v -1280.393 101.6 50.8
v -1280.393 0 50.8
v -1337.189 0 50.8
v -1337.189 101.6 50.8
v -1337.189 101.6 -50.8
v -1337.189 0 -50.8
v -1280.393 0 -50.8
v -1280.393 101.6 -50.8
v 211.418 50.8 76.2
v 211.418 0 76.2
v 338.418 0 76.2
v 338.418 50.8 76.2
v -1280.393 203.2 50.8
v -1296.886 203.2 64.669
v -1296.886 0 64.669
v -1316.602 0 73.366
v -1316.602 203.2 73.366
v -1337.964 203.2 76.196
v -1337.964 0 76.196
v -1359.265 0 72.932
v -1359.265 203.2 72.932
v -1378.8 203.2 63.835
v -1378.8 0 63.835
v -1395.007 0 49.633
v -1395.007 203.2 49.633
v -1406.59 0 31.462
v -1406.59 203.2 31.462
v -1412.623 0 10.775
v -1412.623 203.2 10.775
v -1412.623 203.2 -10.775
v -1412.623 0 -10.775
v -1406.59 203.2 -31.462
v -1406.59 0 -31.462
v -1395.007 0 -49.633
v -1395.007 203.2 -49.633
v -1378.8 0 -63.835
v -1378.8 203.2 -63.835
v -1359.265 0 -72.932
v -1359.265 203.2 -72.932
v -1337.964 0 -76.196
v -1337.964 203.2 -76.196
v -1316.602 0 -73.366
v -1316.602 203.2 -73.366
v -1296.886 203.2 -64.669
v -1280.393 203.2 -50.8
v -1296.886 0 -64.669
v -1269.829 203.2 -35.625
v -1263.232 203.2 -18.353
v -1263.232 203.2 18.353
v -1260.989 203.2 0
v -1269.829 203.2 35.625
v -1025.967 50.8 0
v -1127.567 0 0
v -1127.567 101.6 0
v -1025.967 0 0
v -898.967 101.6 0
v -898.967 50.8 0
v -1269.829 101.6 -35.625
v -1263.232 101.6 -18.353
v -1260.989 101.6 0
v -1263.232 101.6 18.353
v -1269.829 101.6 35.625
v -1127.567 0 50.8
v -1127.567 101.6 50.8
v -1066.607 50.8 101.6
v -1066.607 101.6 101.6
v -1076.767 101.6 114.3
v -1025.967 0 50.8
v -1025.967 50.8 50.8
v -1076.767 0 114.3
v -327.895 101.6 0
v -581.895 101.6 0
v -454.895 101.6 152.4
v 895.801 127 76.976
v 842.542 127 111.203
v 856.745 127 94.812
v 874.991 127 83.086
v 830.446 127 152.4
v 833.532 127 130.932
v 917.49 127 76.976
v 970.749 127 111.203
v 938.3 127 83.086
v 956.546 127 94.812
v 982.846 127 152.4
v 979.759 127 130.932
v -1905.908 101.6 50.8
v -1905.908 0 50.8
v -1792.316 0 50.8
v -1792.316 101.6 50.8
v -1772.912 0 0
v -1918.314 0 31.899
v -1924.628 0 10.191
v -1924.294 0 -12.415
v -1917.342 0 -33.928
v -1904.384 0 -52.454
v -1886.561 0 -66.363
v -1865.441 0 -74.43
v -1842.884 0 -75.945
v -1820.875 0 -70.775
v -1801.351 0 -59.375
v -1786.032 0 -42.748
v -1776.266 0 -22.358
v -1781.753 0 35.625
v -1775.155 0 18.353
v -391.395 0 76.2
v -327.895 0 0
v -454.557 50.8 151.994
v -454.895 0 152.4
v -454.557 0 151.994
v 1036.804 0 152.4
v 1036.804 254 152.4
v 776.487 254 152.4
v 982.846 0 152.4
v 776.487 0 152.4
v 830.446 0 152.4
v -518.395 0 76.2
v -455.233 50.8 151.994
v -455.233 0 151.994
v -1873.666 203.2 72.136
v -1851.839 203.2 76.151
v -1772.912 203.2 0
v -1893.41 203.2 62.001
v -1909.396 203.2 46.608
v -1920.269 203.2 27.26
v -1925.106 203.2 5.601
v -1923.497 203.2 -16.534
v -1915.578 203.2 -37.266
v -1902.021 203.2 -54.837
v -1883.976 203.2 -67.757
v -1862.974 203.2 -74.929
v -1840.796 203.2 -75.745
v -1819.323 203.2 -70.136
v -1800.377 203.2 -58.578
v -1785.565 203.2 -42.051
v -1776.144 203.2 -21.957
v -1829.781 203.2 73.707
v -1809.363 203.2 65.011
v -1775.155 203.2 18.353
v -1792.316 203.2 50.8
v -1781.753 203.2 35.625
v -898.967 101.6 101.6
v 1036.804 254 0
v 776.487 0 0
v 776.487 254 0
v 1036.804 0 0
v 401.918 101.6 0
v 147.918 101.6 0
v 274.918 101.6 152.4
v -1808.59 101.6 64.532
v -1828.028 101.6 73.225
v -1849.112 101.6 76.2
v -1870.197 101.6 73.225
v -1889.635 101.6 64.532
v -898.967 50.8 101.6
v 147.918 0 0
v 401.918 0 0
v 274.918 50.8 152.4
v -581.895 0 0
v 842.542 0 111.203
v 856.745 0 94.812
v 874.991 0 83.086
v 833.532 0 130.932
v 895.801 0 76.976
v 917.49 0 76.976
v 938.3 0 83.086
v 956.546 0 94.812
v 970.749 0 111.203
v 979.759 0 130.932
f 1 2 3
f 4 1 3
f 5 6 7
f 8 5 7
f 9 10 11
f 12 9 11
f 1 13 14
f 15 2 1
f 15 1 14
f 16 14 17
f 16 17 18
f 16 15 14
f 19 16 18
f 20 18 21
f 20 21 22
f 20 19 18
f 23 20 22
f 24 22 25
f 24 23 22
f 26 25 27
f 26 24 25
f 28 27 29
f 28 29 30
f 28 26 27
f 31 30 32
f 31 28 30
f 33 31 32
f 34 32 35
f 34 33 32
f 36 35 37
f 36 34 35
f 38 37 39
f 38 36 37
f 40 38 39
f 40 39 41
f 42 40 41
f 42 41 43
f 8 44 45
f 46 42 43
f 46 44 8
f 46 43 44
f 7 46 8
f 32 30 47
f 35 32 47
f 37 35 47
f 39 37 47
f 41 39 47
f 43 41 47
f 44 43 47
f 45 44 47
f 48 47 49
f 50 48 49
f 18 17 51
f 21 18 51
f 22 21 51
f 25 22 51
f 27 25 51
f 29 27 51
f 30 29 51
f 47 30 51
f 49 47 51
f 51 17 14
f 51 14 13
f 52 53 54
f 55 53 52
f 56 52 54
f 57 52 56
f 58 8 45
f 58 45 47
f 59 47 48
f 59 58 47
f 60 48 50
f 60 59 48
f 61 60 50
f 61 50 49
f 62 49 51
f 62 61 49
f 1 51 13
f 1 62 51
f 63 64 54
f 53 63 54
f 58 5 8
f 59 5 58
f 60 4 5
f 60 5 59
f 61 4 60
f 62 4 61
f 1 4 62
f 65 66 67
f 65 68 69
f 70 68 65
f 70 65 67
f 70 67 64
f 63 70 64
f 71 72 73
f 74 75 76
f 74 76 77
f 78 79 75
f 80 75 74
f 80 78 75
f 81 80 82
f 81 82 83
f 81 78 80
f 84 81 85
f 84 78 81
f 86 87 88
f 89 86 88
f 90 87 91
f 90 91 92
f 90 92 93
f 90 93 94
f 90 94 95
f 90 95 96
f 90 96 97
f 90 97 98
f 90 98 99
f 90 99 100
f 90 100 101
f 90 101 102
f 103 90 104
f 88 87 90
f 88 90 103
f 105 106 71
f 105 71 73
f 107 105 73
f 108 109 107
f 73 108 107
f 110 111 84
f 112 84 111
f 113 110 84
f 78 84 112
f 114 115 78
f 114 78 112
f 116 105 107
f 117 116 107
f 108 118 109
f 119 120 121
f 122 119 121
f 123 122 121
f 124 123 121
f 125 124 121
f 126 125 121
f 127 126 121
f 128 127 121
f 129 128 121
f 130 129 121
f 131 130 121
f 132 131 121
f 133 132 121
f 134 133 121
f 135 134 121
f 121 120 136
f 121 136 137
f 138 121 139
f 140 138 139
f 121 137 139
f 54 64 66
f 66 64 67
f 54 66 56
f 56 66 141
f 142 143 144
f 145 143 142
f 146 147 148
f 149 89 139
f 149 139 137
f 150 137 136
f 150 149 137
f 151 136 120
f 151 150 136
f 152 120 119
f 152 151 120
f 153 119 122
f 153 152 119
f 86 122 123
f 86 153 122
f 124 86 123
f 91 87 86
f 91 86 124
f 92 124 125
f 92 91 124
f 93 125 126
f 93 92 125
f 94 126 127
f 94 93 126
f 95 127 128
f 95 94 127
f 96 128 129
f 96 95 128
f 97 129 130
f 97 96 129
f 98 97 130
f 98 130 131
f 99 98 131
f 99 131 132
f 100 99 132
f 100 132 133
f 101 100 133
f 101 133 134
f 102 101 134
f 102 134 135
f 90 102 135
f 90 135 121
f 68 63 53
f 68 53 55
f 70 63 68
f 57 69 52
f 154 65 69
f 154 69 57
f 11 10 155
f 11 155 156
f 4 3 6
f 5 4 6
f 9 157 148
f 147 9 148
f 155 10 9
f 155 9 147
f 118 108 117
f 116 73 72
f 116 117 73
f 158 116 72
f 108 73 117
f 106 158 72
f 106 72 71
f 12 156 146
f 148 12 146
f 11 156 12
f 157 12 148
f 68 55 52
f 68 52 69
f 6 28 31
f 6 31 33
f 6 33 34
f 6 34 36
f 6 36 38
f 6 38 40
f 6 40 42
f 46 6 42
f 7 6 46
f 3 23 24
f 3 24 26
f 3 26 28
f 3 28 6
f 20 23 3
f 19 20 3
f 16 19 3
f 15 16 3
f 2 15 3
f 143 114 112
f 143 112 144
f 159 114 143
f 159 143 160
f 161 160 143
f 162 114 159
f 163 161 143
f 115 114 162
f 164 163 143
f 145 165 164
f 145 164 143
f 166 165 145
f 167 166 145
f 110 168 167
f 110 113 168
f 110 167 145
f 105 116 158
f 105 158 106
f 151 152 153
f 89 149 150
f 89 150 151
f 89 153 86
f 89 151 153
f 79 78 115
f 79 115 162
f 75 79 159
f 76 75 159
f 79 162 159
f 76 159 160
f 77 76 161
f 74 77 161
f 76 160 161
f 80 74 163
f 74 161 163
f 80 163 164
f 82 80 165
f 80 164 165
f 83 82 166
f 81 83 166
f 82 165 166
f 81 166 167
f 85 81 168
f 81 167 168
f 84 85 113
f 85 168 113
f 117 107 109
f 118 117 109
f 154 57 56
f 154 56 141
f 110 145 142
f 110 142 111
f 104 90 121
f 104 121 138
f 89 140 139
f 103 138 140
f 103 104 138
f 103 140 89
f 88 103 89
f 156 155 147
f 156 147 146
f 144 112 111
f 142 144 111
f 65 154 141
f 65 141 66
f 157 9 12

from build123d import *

# Parameters (mm, degrees)
F1_DEPTH  = 101.6
F2_DEPTH  = 101.6
F3_DEPTH  = 50.8
F5_DEPTH  = 101.6
F9_DEPTH  = 63.5
F10_W     = 127
F10_H     = 50.8
F11_DEPTH = 101.6
F12_DEPTH = 50.8
F14_DEPTH = 203.2
F15_DEPTH = 101.6
F17_DEPTH = 203.2
F18_DEPTH = 101.6
F20_DEPTH = 254
F21_DEPTH = 127


with BuildPart() as f1:
    # F0 (on Front) → F1 (new body)
    with BuildSketch(Plane.XZ):
        Polygon((211.4180455208, 76.2), (147.9180455208, 0), (401.9180455208, 0), (338.4180455208, 76.2), align=None)
    extrude(amount=-F1_DEPTH)

    # F0 (on Front) → F2 (join)
    with BuildSketch(Plane.XZ):
        Polygon((274.9180455208, 152.4), (211.4180455208, 76.2), (338.4180455208, 76.2), align=None)
    extrude(amount=-F2_DEPTH)

    # F0 (on Front) → F3 (cut)
    with BuildSketch(Plane.XZ):
        Polygon((274.9180455208, 152.4), (211.4180455208, 76.2), (338.4180455208, 76.2), align=None)
    extrude(amount=-F3_DEPTH, mode=Mode.SUBTRACT)


with BuildPart() as f5:
    # F4 (on Front) → F5 (new body)
    with BuildSketch(Plane.XZ):
        Polygon((-581.8947255611, 0), (-327.8947255611, 0), (-391.3947255611, 76.2), (-454.8947255611, 76.2), (-518.3947255611, 76.2), align=None)
        Polygon((-454.8947255611, 76.2), (-391.3947255611, 76.2), (-454.8947255611, 152.4), align=None)
        Polygon((-454.8947255611, 152.4), (-518.3947255611, 76.2), (-454.8947255611, 76.2), align=None)
    extrude(amount=-F5_DEPTH)

    # F8 (on 3pt) → F9 (cut, symmetric)
    with BuildSketch(Plane.YZ.offset(-454.8947255611)):
        Polygon((0, 151.9944816828), (0, 76.2), (50.8, 151.9944816828), align=None)
    extrude(amount=F9_DEPTH, both=True, mode=Mode.SUBTRACT)


with BuildPart() as f11:
    # F10 (on Front) → F11 (new body)
    with BuildSketch(Plane.XZ):
        Polygon((-1025.9668144226, 50.8), (-898.9668144226, 50.8), (-898.9668144226, 101.6), (-1066.6068144226, 101.6), align=None)
        Polygon((-1127.5668144226, 0), (-1025.9668144226, 0), (-1025.9668144226, 50.8), (-1066.6068144226, 101.6), (-1076.7668144226, 114.3), (-1127.5668144226, 50.8), align=None)
        with Locations((-962.4668144226, 25.4)):
            Rectangle(F10_W, F10_H)
    extrude(amount=-F11_DEPTH)

    # F10 (on Front) → F12 (cut)
    with BuildSketch(Plane.XZ):
        Polygon((-1025.9668144226, 50.8), (-898.9668144226, 50.8), (-898.9668144226, 101.6), (-1066.6068144226, 101.6), align=None)
        with Locations((-962.4668144226, 25.4)):
            Rectangle(F10_W, F10_H)
    extrude(amount=-F12_DEPTH, mode=Mode.SUBTRACT)


with BuildPart() as f14:
    # F13 (on Front) → F14 (new body)
    with BuildSketch(Plane.XZ):
        with BuildLine():
            ThreePointArc((-1905.9082796818, 50.8), (-1876.301996294, -71.183933753), (-1772.9121530533, 0))
            ThreePointArc((-1772.9121530533, 0), (-1777.9282193003, 27.1898432407), (-1792.3160264248, 50.8))
            Line((-1792.3160264248, 50.8), (-1849.1121530533, 50.8))
            Line((-1849.1121530533, 50.8), (-1905.9082796818, 50.8))
        make_face()
        with BuildLine():
            Line((-1849.1121530533, 50.8), (-1792.3160264248, 50.8))
            ThreePointArc((-1792.3160264248, 50.8), (-1849.1121530533, 76.2), (-1905.9082796818, 50.8))
            Line((-1905.9082796818, 50.8), (-1849.1121530533, 50.8))
        make_face()
    extrude(amount=-F14_DEPTH)

    # F13 (on Front) → F15 (cut)
    with BuildSketch(Plane.XZ):
        with BuildLine():
            Line((-1849.1121530533, 50.8), (-1792.3160264248, 50.8))
            ThreePointArc((-1792.3160264248, 50.8), (-1849.1121530533, 76.2), (-1905.9082796818, 50.8))
            Line((-1905.9082796818, 50.8), (-1849.1121530533, 50.8))
        make_face()
    extrude(amount=-F15_DEPTH, mode=Mode.SUBTRACT)


with BuildPart() as f17:
    # F16 (on Front) → F17 (new body)
    with BuildSketch(Plane.XZ):
        with BuildLine():
            ThreePointArc((-1280.3925940746, -50.8), (-1266.0047869502, -27.1898432407), (-1260.9887207031, 0))
            ThreePointArc((-1260.9887207031, 0), (-1266.0047869502, 27.1898432407), (-1280.3925940746, 50.8))
            Line((-1280.3925940746, 50.8), (-1337.1887207031, 50.8))
            Line((-1337.1887207031, 50.8), (-1337.1887207031, 0))
            Line((-1337.1887207031, 0), (-1337.1887207031, -50.8))
            Line((-1337.1887207031, -50.8), (-1280.3925940746, -50.8))
        make_face()
        with BuildLine():
            Line((-1337.1887207031, 50.8), (-1280.3925940746, 50.8))
            ThreePointArc((-1280.3925940746, 50.8), (-1413.3887207031, 0), (-1280.3925940746, -50.8))
            Line((-1280.3925940746, -50.8), (-1337.1887207031, -50.8))
            Line((-1337.1887207031, -50.8), (-1337.1887207031, 0))
            Line((-1337.1887207031, 0), (-1337.1887207031, 50.8))
        make_face()
    extrude(amount=-F17_DEPTH)

    # F16 (on Front) → F18 (cut)
    with BuildSketch(Plane.XZ):
        with BuildLine():
            ThreePointArc((-1280.3925940746, -50.8), (-1266.0047869502, -27.1898432407), (-1260.9887207031, 0))
            ThreePointArc((-1260.9887207031, 0), (-1266.0047869502, 27.1898432407), (-1280.3925940746, 50.8))
            Line((-1280.3925940746, 50.8), (-1337.1887207031, 50.8))
            Line((-1337.1887207031, 50.8), (-1337.1887207031, 0))
            Line((-1337.1887207031, 0), (-1337.1887207031, -50.8))
            Line((-1337.1887207031, -50.8), (-1280.3925940746, -50.8))
        make_face()
    extrude(amount=-F18_DEPTH, mode=Mode.SUBTRACT)


with BuildPart() as f20:
    # F19 (on Front) → F20 (new body)
    with BuildSketch(Plane.XZ):
        with BuildLine():
            Line((776.4872312546, 152.4), (776.4872312546, 0))
            Line((776.4872312546, 0), (1036.8044717789, 0))
            Line((1036.8044717789, 0), (1036.8044717789, 152.4))
            Line((1036.8044717789, 152.4), (986.0044717789, 152.4))
            Line((986.0044717789, 152.4), (982.8458515167, 152.4))
            ThreePointArc((982.8458515167, 152.4), (906.6458515167, 76.2), (830.4458515167, 152.4))
            Line((830.4458515167, 152.4), (827.2872312546, 152.4))
            Line((827.2872312546, 152.4), (776.4872312546, 152.4))
        make_face()
        with BuildLine():
            Line((906.6458515167, 152.4), (830.4458515167, 152.4))
            ThreePointArc((830.4458515167, 152.4), (906.6458515167, 76.2), (982.8458515167, 152.4))
            Line((982.8458515167, 152.4), (906.6458515167, 152.4))
        make_face()
    extrude(amount=-F20_DEPTH)

    # F19 (on Front) → F21 (cut)
    with BuildSketch(Plane.XZ):
        with BuildLine():
            Line((906.6458515167, 152.4), (830.4458515167, 152.4))
            ThreePointArc((830.4458515167, 152.4), (906.6458515167, 76.2), (982.8458515167, 152.4))
            Line((982.8458515167, 152.4), (906.6458515167, 152.4))
        make_face()
    extrude(amount=-F21_DEPTH, mode=Mode.SUBTRACT)


solid = Compound([f1.part, f5.part, f11.part, f14.part, f17.part, f20.part])
